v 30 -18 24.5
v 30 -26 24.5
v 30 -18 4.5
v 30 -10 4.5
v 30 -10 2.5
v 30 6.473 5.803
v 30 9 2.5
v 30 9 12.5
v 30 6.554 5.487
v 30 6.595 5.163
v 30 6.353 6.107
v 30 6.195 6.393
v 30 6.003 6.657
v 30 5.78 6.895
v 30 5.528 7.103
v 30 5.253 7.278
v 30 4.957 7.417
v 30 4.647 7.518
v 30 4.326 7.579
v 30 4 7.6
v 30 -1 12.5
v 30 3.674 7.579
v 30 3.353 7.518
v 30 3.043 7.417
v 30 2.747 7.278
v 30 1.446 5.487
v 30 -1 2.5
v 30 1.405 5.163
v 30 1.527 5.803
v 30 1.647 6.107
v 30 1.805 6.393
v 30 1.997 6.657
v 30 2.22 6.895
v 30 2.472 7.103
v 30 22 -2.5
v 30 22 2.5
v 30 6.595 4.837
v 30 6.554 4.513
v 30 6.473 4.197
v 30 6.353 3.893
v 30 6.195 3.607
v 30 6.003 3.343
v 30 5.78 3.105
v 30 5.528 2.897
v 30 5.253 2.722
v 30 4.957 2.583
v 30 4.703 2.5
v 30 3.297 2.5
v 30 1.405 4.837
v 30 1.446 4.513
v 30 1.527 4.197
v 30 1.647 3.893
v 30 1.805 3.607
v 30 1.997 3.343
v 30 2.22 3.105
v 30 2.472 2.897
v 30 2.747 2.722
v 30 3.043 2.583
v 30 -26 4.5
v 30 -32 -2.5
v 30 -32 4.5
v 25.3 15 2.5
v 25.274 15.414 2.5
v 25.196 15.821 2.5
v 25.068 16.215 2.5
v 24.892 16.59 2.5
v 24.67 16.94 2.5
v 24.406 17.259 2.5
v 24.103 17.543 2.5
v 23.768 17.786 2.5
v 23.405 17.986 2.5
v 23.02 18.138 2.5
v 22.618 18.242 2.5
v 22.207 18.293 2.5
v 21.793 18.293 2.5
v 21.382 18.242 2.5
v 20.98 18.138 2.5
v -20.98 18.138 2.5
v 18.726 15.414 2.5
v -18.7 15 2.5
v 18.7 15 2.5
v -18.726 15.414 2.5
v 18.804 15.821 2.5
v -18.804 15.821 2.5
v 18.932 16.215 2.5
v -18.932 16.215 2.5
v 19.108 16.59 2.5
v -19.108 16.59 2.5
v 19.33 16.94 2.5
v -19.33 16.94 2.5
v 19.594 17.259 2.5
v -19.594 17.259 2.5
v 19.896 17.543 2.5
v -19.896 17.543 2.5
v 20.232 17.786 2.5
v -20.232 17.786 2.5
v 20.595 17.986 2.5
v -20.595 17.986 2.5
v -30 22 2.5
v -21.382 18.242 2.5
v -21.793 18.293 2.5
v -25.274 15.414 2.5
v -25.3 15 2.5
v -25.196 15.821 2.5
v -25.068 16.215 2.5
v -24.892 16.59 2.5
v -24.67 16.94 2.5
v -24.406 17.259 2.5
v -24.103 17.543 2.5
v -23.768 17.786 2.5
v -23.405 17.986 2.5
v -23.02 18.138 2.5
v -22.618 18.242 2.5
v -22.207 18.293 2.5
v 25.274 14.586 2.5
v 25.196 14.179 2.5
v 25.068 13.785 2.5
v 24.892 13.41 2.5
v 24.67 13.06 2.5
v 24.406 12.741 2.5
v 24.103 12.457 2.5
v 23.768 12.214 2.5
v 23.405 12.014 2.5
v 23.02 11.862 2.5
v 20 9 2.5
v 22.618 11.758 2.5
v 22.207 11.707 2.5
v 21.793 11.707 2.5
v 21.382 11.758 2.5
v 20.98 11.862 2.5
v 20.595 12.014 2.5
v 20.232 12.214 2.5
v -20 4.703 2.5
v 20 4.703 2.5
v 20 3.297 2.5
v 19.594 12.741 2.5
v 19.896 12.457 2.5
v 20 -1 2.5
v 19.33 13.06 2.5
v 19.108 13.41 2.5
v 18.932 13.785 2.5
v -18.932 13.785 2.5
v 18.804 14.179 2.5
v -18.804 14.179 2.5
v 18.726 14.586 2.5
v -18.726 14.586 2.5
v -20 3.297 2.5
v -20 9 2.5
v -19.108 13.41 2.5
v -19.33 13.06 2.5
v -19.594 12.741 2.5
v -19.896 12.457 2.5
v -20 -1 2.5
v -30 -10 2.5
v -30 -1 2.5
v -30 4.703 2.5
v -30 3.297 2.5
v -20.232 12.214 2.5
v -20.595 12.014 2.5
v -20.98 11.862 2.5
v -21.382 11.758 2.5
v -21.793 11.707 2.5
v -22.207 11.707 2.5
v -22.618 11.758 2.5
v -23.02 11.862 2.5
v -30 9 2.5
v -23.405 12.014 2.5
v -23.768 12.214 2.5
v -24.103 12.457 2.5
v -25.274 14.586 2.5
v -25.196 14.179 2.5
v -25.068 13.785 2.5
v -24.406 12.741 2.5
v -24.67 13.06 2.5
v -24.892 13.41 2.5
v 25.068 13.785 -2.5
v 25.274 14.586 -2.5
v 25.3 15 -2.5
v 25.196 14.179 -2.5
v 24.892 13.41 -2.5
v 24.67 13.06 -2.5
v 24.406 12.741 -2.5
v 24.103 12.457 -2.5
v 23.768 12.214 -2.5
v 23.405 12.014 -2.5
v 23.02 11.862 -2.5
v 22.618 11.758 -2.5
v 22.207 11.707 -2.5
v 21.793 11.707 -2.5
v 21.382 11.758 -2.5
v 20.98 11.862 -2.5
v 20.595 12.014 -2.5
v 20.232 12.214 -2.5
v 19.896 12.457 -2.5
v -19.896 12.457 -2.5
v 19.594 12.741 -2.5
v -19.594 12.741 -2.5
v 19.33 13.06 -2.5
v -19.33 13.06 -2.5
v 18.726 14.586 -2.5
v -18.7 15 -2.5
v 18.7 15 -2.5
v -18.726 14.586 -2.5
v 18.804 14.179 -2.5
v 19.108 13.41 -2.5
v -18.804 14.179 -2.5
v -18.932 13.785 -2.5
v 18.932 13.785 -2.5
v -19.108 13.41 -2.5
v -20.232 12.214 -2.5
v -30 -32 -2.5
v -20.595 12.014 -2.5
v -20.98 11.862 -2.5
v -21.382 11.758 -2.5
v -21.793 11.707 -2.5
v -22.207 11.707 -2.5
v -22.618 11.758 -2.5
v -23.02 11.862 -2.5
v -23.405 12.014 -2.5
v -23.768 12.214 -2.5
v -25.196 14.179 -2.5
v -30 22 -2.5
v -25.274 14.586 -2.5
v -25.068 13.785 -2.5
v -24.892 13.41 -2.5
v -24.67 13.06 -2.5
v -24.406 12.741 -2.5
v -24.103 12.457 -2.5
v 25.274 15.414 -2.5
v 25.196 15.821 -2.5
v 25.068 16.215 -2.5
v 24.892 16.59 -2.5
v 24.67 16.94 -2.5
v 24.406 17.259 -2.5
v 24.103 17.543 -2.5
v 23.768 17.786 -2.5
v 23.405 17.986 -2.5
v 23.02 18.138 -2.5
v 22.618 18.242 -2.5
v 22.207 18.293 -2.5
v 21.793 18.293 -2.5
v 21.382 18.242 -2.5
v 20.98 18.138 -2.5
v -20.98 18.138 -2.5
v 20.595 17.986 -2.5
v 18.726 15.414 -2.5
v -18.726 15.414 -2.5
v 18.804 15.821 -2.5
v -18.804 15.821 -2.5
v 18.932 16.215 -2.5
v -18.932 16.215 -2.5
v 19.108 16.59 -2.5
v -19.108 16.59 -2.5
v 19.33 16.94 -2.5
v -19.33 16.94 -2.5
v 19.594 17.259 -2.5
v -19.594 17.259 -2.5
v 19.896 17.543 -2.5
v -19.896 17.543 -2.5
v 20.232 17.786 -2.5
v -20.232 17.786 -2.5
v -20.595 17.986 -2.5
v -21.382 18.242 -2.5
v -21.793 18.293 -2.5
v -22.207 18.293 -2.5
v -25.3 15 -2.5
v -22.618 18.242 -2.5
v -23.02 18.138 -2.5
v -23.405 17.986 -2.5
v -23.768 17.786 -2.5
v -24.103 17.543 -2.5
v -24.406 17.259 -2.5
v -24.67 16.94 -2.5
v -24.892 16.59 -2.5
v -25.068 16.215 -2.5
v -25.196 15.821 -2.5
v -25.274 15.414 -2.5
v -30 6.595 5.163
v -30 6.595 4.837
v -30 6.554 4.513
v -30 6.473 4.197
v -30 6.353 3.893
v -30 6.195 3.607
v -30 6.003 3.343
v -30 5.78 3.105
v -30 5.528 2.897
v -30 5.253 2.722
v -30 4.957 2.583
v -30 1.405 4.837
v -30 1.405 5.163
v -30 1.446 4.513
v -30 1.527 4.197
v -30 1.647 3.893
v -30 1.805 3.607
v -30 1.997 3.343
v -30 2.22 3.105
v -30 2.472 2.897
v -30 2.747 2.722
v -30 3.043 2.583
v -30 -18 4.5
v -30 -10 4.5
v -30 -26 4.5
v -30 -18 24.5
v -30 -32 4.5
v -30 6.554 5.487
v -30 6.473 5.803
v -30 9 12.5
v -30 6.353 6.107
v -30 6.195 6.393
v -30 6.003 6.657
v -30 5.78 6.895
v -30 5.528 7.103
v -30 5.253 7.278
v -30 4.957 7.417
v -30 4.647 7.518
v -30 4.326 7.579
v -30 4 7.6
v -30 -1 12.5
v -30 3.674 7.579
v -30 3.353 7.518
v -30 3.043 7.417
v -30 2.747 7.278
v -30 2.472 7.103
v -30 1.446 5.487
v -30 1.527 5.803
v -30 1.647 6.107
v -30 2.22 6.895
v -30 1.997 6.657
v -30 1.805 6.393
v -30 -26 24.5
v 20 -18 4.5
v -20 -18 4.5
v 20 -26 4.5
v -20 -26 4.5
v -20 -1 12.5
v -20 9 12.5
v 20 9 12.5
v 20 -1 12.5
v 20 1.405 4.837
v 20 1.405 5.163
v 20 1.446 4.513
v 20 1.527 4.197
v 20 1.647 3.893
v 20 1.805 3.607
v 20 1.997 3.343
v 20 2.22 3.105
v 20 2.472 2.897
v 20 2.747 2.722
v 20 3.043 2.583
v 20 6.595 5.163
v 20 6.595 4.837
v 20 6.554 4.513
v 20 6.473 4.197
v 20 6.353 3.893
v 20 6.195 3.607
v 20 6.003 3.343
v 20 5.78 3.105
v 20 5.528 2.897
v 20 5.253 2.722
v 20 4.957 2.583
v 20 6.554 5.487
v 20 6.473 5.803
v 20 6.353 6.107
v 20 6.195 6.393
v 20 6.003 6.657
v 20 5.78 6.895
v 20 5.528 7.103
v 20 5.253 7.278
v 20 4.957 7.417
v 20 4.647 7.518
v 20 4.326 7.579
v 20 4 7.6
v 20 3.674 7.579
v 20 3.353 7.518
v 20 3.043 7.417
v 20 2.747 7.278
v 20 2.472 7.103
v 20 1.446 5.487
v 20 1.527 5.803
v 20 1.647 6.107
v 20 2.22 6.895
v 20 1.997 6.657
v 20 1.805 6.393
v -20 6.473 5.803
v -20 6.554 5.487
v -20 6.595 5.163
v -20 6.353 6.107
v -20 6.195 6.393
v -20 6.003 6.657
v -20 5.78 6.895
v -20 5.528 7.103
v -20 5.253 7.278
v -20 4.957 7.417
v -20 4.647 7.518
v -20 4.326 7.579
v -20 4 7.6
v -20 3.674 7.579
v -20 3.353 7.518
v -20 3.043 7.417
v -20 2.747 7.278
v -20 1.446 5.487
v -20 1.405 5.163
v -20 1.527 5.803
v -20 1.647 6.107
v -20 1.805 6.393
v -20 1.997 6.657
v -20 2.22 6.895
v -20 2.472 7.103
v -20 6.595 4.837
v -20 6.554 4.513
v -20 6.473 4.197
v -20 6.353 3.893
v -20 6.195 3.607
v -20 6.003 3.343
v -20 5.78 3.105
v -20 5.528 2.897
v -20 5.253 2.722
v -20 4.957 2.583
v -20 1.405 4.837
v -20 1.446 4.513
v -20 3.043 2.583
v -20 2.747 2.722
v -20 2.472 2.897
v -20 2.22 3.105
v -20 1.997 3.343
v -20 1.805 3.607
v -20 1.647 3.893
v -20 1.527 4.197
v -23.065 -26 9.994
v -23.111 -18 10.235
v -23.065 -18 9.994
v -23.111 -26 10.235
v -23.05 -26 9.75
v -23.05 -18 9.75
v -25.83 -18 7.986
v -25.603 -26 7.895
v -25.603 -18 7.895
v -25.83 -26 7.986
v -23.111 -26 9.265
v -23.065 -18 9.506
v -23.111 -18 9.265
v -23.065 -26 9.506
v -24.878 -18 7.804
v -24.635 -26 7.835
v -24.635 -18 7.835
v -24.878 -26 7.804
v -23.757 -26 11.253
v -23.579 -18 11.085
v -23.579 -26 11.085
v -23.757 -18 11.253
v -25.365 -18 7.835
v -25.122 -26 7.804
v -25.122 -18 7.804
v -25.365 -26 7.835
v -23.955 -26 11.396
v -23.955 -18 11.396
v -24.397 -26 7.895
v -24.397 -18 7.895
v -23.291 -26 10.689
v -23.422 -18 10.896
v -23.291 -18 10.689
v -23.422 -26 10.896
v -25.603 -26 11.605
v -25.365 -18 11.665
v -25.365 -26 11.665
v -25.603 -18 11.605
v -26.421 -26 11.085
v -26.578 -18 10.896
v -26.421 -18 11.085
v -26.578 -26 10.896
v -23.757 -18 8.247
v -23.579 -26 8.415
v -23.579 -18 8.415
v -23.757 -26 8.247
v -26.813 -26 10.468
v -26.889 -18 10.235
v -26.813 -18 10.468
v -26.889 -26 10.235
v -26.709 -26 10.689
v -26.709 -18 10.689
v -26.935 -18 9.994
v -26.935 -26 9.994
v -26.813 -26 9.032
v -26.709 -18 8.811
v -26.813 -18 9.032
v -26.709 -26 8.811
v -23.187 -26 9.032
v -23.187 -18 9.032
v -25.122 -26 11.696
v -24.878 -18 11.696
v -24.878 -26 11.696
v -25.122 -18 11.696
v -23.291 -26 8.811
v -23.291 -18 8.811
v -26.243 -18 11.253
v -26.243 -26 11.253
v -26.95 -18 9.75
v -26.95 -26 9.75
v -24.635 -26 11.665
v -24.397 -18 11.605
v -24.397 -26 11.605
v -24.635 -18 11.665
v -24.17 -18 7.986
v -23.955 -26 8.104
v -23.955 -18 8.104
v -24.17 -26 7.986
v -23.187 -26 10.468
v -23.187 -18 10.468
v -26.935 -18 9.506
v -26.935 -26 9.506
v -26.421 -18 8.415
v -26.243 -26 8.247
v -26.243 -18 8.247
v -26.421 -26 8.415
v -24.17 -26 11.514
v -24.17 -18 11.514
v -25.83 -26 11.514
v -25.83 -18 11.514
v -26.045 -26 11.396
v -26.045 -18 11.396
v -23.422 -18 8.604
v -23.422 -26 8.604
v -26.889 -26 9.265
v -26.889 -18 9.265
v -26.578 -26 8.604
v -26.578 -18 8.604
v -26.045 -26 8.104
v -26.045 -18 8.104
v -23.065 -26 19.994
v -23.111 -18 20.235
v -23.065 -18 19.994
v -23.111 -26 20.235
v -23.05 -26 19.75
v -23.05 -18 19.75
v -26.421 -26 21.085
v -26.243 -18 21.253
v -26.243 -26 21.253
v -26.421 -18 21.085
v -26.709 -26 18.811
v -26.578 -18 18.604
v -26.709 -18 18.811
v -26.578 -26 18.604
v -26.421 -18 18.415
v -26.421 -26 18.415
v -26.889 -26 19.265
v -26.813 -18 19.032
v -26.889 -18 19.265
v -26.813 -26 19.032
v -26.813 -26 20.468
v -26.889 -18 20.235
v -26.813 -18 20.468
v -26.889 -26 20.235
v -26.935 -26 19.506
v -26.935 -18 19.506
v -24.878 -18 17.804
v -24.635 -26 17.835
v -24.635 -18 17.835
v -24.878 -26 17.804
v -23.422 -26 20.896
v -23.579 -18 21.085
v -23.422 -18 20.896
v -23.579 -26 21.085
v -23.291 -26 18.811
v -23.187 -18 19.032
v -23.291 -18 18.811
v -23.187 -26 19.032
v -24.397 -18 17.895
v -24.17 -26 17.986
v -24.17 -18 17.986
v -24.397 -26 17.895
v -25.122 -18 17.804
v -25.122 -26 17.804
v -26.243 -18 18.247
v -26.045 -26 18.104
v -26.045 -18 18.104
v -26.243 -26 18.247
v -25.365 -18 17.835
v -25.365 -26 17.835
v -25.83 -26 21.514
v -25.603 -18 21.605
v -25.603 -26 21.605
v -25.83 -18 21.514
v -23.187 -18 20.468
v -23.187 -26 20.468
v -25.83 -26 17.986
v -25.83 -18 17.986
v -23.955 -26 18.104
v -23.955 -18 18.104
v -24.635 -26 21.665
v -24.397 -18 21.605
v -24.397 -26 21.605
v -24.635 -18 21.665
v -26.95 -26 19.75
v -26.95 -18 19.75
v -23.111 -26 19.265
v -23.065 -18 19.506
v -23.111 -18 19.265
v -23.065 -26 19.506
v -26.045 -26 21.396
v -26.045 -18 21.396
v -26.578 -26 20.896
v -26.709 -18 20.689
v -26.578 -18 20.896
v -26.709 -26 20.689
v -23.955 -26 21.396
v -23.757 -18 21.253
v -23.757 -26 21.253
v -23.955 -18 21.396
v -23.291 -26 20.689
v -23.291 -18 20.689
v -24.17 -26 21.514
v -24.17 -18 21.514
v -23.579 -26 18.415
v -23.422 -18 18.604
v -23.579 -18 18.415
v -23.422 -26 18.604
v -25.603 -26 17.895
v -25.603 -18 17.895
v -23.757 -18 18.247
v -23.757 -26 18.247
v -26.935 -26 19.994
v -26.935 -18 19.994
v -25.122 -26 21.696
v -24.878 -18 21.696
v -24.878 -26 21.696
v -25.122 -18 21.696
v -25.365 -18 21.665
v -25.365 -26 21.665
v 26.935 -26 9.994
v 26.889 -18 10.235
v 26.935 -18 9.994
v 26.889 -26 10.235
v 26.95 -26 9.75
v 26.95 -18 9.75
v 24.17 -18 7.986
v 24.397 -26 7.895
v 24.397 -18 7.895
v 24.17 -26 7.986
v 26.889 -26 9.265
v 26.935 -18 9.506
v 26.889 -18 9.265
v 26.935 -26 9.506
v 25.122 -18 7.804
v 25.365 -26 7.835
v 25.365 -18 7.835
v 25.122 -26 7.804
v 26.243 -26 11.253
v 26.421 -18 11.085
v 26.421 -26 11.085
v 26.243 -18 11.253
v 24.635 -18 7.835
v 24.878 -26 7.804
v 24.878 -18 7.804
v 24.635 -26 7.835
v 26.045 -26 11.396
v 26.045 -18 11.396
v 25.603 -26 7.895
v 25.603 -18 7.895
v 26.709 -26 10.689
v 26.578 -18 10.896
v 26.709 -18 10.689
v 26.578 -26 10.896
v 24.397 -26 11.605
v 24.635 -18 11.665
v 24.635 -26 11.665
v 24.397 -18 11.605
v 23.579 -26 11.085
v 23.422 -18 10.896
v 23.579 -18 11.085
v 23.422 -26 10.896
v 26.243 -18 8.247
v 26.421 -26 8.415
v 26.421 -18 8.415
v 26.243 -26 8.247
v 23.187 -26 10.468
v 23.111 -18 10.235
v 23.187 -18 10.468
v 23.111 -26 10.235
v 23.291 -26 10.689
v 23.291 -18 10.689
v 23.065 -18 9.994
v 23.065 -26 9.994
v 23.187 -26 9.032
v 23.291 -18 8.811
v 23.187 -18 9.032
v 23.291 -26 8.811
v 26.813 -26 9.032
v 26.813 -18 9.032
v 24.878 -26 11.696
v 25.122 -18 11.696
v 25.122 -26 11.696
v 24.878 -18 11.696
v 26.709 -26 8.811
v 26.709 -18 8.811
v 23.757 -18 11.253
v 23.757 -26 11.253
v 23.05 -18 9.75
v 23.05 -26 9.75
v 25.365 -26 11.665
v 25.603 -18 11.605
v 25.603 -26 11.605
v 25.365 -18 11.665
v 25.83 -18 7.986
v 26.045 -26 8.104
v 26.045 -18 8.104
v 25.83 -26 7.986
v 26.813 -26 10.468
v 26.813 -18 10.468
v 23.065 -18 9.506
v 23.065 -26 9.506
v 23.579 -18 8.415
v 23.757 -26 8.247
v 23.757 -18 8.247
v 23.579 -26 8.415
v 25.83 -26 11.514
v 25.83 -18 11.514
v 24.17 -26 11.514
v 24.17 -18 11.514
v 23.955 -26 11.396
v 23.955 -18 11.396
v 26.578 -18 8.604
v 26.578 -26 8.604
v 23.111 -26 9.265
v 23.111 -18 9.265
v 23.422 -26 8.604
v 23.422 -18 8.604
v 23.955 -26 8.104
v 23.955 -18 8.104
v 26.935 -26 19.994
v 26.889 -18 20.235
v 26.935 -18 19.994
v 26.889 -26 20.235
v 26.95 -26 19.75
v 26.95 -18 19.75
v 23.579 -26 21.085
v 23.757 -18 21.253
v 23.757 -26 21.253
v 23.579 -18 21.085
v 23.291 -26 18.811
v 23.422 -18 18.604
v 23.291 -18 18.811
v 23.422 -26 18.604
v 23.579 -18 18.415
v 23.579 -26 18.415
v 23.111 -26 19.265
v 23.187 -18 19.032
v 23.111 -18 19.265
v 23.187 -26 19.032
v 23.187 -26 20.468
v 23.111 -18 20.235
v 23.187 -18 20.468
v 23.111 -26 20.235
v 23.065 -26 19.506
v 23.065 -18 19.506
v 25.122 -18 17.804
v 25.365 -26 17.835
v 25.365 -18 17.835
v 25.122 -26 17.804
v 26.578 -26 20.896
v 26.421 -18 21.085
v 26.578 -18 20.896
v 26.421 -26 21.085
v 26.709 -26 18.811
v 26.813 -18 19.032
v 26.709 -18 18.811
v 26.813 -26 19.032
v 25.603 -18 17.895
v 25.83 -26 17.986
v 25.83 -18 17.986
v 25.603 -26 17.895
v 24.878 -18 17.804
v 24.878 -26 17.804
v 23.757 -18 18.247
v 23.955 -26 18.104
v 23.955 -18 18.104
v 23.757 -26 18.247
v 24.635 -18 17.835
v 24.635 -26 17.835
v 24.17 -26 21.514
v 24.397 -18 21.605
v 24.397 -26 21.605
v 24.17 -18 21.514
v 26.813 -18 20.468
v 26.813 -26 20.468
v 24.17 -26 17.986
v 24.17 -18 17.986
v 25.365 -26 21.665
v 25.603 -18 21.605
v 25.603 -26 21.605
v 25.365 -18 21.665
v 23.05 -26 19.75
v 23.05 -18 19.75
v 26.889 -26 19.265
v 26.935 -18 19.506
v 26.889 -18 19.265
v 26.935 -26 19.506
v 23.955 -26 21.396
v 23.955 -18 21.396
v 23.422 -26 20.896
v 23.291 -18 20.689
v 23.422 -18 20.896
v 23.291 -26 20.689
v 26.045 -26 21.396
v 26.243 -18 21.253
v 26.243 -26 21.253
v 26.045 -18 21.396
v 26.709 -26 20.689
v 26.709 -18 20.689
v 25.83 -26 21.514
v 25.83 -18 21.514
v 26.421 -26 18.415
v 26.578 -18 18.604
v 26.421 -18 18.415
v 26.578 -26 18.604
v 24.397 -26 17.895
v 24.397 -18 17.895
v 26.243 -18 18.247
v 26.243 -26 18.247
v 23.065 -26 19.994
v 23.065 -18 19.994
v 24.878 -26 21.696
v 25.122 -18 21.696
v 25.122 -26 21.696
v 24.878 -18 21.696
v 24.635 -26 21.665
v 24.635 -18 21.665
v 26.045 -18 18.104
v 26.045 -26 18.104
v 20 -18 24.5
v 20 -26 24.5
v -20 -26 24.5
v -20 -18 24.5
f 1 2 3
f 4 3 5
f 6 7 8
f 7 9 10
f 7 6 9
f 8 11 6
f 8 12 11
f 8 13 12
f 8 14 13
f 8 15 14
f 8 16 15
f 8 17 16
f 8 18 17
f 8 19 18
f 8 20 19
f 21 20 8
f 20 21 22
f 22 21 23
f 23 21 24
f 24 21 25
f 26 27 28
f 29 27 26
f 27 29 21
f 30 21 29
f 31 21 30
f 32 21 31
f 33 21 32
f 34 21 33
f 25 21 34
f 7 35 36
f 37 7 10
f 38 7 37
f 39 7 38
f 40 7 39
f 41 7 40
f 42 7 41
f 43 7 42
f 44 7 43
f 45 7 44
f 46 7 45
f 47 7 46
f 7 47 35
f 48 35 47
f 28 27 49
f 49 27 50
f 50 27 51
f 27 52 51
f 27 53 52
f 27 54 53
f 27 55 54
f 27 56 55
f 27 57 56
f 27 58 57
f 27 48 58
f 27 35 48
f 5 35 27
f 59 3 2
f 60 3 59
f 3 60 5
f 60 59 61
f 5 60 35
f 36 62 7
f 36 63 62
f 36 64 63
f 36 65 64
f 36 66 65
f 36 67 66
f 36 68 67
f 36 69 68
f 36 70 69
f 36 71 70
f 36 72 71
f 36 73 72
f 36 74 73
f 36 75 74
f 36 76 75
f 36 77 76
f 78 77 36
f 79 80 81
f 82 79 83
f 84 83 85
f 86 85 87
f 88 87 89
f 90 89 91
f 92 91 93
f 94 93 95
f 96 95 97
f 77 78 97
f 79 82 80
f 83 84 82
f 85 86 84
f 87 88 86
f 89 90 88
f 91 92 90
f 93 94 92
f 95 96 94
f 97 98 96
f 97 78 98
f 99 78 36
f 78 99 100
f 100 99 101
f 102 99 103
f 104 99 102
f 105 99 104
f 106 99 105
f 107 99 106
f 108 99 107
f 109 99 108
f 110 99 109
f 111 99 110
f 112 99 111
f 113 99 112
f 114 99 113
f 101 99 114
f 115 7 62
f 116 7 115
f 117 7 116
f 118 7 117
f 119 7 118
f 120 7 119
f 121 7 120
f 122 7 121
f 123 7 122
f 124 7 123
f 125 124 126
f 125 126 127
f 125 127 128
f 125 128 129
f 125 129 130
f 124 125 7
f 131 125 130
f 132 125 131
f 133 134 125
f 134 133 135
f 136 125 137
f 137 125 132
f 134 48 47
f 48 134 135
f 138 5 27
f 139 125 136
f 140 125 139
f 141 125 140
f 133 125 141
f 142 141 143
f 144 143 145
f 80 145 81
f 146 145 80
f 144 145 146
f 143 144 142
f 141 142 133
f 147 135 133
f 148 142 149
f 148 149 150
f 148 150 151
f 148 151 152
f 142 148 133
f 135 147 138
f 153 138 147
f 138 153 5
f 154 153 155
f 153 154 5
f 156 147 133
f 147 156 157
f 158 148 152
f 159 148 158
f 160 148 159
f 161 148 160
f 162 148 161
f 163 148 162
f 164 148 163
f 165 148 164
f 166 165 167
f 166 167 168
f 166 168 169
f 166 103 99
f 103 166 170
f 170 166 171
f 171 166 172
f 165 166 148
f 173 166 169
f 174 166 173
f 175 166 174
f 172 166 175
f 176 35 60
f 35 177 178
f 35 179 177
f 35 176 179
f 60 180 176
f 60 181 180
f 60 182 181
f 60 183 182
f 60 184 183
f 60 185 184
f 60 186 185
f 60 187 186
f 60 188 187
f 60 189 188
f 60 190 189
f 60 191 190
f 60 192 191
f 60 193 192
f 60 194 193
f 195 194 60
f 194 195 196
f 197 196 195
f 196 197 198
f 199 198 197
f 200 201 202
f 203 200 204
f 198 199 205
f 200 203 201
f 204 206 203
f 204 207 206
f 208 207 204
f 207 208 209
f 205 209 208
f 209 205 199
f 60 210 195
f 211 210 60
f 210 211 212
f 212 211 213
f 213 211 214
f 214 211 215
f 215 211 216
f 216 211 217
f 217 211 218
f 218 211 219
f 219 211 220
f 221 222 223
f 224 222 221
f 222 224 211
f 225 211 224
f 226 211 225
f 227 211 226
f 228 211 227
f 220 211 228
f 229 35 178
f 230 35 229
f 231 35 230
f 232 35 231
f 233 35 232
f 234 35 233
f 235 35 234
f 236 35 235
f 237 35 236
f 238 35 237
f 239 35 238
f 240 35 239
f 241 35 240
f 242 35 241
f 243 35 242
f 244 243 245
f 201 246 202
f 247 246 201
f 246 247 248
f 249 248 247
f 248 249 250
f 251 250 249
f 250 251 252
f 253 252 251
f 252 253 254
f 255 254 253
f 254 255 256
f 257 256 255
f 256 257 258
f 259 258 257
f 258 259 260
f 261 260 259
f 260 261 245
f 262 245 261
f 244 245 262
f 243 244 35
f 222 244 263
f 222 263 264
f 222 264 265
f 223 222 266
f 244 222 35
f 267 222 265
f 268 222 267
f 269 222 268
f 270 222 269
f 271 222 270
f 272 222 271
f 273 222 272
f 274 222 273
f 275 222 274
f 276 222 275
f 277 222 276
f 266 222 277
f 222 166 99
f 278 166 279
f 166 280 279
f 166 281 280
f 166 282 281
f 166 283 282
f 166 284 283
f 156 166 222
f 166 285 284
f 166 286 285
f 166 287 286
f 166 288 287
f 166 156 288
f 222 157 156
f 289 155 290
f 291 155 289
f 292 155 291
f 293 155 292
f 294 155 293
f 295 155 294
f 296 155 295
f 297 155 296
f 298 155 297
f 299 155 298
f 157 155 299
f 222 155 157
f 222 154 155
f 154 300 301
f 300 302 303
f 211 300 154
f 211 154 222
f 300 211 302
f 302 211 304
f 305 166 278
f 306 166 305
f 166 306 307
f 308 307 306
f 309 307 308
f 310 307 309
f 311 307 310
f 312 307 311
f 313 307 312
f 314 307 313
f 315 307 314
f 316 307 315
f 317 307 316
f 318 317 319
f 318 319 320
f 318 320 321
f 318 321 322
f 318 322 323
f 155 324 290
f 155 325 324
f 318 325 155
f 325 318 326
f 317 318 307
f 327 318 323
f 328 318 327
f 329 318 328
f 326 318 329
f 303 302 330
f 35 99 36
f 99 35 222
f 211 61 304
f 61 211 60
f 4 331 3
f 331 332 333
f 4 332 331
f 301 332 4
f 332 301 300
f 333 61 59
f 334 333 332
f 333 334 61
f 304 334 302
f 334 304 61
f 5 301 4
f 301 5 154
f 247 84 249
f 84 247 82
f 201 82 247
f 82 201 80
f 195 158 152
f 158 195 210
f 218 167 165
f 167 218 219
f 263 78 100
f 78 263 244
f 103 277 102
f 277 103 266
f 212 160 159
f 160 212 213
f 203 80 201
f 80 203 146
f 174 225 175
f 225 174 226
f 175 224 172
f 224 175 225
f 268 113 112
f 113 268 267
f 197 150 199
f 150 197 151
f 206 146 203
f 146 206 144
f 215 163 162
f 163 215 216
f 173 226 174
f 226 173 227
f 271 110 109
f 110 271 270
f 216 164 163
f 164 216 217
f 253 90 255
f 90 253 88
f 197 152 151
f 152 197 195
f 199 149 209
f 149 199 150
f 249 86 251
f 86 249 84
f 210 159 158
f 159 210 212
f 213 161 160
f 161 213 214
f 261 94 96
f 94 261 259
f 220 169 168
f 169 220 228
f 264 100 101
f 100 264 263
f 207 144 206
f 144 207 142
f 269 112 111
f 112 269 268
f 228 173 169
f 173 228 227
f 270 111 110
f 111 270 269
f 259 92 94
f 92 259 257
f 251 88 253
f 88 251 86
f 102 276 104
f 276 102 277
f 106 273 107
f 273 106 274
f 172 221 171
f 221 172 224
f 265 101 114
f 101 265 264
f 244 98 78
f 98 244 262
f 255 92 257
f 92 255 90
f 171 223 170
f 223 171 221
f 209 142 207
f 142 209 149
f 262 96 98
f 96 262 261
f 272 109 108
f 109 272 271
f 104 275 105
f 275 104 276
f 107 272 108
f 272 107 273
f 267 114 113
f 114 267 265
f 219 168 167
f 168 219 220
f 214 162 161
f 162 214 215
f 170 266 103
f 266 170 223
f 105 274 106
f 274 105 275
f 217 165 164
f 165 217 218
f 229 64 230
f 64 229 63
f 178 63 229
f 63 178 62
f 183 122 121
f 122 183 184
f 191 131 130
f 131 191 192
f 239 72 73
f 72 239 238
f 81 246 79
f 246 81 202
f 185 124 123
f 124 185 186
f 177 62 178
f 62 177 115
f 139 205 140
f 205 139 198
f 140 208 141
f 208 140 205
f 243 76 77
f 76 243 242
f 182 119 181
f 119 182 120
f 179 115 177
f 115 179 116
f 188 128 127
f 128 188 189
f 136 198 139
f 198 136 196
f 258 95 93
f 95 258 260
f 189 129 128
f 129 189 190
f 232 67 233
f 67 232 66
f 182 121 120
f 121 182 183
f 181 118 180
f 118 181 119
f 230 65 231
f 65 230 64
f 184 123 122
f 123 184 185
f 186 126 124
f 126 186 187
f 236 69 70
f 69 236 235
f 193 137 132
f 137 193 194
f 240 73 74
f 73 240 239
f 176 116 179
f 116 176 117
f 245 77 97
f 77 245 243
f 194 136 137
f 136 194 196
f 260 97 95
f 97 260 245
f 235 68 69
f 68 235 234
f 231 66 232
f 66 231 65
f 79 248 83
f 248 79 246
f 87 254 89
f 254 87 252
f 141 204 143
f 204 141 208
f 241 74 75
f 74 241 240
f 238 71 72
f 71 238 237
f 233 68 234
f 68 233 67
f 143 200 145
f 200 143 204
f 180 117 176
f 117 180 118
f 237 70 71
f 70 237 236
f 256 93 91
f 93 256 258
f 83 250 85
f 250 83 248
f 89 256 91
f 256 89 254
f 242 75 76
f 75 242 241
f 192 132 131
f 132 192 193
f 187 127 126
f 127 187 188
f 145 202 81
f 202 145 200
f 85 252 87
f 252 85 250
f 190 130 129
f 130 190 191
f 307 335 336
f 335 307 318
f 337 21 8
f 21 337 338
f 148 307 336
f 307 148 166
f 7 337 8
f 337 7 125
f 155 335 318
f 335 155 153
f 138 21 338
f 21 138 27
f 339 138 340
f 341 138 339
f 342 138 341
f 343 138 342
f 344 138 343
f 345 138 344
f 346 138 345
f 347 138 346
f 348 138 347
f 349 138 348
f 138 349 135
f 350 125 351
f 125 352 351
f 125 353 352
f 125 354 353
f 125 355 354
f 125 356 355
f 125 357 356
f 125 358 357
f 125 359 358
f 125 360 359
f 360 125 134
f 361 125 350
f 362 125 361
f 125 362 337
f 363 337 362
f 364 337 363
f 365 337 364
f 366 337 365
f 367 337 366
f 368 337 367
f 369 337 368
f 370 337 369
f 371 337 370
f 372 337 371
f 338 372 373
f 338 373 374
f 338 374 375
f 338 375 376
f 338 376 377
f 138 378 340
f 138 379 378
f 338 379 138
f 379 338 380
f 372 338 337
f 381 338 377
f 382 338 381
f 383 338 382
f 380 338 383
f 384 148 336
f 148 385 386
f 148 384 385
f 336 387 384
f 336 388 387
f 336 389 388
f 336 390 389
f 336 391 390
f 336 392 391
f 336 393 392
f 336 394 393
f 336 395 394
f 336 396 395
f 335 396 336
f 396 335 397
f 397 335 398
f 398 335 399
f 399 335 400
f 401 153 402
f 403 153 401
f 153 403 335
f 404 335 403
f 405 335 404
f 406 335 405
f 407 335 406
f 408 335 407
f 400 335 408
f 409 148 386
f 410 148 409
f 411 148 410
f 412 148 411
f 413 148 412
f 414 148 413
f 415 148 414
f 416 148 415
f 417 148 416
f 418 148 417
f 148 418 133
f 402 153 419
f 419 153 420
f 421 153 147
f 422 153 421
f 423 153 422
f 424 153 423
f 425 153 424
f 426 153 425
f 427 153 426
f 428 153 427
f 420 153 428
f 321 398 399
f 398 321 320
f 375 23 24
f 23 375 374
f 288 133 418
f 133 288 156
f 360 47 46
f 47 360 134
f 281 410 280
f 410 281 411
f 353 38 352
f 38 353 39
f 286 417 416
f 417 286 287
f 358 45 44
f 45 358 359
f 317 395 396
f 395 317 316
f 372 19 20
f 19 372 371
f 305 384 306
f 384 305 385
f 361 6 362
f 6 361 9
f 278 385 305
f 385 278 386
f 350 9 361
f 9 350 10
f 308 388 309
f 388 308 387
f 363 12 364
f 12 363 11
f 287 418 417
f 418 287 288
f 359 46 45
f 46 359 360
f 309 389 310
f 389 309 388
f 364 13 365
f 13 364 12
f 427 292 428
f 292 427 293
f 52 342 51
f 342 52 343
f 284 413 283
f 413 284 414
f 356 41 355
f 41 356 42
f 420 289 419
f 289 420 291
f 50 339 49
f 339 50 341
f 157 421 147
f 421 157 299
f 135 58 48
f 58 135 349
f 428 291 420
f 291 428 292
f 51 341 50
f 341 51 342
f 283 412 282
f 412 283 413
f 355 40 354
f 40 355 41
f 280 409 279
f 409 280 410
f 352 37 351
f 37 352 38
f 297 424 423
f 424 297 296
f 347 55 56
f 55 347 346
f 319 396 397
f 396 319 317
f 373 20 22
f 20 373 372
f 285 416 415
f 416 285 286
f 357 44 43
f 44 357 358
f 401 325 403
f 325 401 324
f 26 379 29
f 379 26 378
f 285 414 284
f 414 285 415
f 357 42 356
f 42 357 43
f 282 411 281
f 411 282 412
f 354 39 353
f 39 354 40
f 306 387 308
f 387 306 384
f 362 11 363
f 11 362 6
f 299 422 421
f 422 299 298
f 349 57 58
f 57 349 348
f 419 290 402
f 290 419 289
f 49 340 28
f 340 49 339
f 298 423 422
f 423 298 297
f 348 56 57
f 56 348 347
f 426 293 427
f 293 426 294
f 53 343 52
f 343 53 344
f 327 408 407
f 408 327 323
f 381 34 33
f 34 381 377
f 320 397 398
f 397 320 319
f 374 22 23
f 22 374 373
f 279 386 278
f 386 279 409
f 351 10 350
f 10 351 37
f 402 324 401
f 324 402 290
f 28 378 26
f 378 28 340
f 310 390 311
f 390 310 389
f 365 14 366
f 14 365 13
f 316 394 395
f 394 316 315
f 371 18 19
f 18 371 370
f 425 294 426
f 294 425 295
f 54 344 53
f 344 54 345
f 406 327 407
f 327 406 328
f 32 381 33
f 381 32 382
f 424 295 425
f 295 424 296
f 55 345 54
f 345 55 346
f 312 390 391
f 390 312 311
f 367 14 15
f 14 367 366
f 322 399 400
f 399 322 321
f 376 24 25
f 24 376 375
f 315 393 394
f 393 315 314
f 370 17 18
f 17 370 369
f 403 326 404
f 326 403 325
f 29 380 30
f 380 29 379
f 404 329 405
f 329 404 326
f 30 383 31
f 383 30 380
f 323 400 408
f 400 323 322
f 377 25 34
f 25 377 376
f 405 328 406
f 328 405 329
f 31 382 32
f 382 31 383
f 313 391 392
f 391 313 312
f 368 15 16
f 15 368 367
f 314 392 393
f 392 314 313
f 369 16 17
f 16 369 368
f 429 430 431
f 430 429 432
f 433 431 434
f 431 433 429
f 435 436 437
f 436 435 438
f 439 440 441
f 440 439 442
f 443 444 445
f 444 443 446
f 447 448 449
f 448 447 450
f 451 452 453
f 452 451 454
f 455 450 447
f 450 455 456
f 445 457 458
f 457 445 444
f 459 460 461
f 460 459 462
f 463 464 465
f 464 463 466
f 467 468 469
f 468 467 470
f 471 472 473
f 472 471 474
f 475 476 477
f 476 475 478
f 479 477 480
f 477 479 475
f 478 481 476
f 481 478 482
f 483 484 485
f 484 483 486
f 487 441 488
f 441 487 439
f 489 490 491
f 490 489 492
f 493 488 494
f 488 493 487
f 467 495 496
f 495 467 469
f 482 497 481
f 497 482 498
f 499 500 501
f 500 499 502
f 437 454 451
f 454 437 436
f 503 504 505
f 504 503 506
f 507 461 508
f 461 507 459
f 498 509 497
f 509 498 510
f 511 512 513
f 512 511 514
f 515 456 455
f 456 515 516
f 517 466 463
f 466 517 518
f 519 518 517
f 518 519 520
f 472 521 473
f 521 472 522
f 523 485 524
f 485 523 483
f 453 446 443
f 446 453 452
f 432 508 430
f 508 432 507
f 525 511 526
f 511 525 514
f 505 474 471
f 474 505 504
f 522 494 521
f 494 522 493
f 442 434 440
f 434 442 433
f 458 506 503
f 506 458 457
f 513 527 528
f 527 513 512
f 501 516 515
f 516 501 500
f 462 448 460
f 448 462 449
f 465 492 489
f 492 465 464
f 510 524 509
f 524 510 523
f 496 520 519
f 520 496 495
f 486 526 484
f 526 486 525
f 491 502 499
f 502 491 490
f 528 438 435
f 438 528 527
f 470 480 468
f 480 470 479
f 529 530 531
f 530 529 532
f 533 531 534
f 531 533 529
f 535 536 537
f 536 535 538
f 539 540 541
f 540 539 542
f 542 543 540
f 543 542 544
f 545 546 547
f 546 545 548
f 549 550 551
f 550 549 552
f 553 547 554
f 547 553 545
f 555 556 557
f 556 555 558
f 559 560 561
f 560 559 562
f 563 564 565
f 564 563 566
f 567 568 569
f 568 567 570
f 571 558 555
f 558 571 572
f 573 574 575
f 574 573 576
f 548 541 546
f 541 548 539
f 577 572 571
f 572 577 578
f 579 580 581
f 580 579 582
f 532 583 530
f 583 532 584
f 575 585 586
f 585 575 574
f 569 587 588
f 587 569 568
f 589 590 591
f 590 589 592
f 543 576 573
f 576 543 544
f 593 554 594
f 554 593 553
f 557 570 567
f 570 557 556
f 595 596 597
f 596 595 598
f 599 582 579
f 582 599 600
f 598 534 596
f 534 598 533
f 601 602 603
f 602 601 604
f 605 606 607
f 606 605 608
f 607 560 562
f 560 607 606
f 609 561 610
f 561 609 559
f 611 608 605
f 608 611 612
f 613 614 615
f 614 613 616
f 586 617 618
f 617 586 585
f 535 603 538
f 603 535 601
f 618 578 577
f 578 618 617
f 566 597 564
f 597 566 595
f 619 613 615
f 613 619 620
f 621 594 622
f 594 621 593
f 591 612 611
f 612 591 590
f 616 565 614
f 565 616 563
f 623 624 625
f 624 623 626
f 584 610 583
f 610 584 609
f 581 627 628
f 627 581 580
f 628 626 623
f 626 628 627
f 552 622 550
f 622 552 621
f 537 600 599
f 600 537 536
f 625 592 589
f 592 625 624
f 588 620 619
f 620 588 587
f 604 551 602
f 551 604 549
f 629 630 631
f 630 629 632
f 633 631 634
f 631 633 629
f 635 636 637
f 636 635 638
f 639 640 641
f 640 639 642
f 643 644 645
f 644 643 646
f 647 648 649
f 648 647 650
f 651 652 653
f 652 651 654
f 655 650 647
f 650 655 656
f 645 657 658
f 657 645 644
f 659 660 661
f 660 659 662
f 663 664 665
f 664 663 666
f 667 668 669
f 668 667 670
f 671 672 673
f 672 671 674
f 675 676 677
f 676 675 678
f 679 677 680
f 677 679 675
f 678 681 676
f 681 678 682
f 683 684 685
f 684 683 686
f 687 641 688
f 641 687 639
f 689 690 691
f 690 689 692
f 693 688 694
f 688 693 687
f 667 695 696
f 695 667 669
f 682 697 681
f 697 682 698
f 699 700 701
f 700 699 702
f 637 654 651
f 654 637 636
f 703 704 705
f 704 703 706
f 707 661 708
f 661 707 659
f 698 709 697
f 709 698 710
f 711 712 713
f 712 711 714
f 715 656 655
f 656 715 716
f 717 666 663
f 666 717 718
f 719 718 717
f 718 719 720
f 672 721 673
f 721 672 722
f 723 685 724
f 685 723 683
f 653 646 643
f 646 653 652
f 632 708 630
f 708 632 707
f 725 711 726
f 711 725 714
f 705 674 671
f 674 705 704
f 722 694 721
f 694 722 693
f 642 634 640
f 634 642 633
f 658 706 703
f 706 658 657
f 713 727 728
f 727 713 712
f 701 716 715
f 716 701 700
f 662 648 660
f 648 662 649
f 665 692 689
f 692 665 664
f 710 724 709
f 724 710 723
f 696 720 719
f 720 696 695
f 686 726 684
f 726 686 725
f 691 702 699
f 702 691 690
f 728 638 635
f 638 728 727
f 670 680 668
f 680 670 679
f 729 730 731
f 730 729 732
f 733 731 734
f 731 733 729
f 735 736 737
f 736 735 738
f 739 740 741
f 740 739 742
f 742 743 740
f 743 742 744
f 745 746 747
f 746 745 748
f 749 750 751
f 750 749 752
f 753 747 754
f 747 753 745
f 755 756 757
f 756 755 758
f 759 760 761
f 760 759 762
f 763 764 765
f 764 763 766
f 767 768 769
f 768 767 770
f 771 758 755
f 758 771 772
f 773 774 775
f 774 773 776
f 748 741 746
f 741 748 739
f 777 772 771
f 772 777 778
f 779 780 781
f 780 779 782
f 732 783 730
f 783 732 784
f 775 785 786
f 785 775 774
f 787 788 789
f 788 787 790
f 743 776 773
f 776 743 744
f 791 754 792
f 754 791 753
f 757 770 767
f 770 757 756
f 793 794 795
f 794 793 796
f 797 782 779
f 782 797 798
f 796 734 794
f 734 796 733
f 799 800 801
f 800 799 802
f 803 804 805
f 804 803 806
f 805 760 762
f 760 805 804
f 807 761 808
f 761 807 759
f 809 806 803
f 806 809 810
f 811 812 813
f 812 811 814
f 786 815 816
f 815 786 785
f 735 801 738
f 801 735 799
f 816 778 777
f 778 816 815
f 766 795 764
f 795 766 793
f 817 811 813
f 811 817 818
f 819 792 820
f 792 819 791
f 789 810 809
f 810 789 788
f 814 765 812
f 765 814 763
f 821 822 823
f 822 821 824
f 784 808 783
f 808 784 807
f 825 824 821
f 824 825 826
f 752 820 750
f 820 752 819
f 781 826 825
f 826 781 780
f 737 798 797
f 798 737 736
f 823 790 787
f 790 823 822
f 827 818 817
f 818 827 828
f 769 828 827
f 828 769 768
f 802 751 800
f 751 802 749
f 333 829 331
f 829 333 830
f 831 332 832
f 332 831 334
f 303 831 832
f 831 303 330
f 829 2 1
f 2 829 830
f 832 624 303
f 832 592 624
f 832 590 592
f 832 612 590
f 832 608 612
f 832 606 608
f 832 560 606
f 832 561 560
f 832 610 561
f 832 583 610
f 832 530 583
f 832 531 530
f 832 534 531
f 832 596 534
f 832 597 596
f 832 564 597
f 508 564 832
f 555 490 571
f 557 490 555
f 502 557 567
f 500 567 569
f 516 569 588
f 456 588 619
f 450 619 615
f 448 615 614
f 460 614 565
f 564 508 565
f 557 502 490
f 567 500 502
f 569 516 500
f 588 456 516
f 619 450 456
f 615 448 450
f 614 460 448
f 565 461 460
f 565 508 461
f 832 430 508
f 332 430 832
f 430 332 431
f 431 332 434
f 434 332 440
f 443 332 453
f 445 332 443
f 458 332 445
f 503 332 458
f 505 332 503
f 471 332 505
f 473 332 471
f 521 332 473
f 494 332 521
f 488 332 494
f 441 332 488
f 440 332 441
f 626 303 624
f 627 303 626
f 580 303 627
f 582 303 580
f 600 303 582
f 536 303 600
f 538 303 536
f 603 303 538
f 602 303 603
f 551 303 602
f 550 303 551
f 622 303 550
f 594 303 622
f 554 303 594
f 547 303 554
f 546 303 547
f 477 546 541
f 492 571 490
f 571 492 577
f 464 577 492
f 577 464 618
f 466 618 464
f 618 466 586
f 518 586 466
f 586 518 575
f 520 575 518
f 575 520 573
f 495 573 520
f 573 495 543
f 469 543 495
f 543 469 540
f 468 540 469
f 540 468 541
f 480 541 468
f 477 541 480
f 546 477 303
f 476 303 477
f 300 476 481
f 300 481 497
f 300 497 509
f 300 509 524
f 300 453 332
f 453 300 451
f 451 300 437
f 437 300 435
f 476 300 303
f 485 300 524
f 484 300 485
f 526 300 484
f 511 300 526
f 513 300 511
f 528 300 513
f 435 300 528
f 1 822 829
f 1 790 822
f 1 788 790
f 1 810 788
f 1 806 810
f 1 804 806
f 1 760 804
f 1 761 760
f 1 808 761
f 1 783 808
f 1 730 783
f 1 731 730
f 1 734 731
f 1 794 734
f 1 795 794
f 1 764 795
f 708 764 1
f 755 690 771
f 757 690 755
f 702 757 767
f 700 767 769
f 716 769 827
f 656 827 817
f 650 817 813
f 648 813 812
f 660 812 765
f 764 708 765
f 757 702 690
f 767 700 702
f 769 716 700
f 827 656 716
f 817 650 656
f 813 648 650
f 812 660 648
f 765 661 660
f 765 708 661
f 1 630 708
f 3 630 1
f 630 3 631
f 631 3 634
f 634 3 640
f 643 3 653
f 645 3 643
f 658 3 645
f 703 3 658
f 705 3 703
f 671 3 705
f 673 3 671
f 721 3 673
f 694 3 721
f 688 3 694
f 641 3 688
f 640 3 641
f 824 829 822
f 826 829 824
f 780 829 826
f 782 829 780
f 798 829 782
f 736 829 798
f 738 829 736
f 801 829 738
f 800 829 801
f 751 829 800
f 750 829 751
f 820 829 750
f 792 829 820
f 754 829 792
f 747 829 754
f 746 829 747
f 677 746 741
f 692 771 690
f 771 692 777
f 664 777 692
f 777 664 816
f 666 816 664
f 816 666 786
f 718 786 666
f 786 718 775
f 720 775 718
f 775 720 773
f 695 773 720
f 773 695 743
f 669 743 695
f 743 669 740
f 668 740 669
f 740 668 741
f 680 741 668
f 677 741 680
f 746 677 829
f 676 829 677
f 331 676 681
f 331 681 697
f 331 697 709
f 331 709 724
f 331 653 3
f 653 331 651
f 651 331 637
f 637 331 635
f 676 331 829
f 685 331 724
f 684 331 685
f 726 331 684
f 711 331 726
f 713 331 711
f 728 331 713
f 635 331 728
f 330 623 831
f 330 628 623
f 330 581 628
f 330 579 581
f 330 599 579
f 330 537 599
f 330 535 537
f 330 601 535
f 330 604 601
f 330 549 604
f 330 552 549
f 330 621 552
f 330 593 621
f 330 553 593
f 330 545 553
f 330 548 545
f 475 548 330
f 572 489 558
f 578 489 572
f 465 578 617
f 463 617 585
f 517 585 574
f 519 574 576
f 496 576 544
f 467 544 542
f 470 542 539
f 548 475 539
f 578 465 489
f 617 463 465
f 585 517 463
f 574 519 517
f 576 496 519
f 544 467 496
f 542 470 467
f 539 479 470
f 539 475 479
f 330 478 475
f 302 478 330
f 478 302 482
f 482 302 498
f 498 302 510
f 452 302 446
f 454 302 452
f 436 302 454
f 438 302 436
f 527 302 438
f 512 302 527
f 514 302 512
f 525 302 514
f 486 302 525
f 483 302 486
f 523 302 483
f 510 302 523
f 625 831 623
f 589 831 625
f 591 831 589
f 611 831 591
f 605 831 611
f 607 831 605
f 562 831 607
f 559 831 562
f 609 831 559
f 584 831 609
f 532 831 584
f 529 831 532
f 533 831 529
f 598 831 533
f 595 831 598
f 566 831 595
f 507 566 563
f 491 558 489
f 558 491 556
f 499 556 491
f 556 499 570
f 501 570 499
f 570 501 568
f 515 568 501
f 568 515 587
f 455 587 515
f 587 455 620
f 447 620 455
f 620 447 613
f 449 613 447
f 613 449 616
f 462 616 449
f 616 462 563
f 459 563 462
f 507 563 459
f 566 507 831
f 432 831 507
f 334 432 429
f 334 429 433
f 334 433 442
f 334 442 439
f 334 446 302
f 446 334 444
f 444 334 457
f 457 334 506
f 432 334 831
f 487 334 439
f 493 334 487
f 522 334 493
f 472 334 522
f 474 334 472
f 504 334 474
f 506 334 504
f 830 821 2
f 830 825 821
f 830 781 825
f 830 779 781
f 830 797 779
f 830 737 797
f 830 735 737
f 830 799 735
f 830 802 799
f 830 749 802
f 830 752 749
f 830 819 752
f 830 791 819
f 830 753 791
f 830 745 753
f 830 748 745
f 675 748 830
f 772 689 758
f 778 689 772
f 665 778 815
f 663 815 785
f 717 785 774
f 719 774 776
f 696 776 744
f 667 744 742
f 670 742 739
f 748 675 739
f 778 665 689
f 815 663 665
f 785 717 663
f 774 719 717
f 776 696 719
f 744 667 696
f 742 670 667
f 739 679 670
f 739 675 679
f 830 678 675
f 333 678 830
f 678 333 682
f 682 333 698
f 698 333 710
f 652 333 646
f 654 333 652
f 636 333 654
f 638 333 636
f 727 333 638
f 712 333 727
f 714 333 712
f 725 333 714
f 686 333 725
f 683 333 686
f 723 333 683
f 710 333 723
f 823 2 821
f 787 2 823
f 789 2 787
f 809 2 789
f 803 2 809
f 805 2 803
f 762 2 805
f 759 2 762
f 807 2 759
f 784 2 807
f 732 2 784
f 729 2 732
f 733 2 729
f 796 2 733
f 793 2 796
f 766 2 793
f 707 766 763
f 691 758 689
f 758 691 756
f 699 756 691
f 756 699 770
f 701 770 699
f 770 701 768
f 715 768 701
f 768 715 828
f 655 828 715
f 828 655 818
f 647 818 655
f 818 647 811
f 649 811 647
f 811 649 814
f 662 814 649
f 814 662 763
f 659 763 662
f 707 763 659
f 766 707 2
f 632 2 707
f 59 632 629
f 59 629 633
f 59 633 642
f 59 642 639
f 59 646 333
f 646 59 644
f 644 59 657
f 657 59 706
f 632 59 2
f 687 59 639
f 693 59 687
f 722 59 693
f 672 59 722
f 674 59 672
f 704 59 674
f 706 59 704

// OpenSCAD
/********************************************************
This file is part of the RepRapPNP project, developed at the University of Hamburg.
Author: Florens Wasserfall <wasserfall@kalanka.de> 
License: 'GNU Affero General Public License AGPLv3 http://www.gnu.org/licenses/agpl.html' 
*******************************************************/

// general object resolution
$fn = 50;

thickness = 5;
width = 60;
tube_dia = 5;

//pressure_wheel();
servo_mount();


module servo_mount() {
	union() {
		//base plate
		difference() {
			union() {
				translate([0, -5, 0]) cube(size=[width, 54, thickness], center=true);
				translate([0, -21, 2]) cube(size=[width, 22, thickness], center=true);
			}
			for(i=[-1, 1]) {
				translate([i*(width/2-8), 15, 0]) cylinder(r=3.3, h=20, center=true);
			}
		}
		//tube fitting
		translate([0, 4, 0]) {
			difference() {
				translate([0, 0, tube_dia+thickness/2]) cube(size=[width, tube_dia*2, tube_dia*2], center=true);
				cube(size=[40, 30, 30], center=true);
				translate([0, 0, thickness/2+tube_dia/2]) rotate([0, 90, 0]) cylinder(r=tube_dia/2+0.1, h=100, center=true);
			}
		}

		//servo mount (distance to tube center: ~22mm)
		difference() {
			translate([0, -22, 10+thickness/2+2]) cube(size=[width, 8, 20], center=true);
			translate([0, -8.5, 10+thickness/2]) cube(size=[41, 9, 21], center=true);
			#translate([0, -27.5, thickness/2+2]) servo();
		}
	}
}

module pressure_wheel() {
	difference() {
		cylinder(r=12, h=9, center=true);
		cylinder(r=1.65, h=10, center=true);
		for(i=[0, 2.4]){
			translate([0, 0, i]) cylinder(r=3.3, h=2.5, $fn=6, center=false);
		}
	}
}

module servo() {
	x = 40;
	y = 41;
	z = 20.5;

	color("Blue") translate([0, 0, z/2]) {
		difference() {
			union() {
				cube(size=[x, y, z], center=true);
				translate([0, 11, 0]) cube(size=[54.5, 2.5, z], center=true);
				translate([-10, y/2, 0]) rotate([-90, 0, 0]) cylinder(r=3.5, h=9, center=false);
				for(i=[-1, 1]) {
					for(j=[-1, 1]) {
						translate([i*25, 10, j*5]) rotate([90, 0, 0]) cylinder(r=1.95, h=30, center=true);
					}
				}
			}
		}
	}
}
